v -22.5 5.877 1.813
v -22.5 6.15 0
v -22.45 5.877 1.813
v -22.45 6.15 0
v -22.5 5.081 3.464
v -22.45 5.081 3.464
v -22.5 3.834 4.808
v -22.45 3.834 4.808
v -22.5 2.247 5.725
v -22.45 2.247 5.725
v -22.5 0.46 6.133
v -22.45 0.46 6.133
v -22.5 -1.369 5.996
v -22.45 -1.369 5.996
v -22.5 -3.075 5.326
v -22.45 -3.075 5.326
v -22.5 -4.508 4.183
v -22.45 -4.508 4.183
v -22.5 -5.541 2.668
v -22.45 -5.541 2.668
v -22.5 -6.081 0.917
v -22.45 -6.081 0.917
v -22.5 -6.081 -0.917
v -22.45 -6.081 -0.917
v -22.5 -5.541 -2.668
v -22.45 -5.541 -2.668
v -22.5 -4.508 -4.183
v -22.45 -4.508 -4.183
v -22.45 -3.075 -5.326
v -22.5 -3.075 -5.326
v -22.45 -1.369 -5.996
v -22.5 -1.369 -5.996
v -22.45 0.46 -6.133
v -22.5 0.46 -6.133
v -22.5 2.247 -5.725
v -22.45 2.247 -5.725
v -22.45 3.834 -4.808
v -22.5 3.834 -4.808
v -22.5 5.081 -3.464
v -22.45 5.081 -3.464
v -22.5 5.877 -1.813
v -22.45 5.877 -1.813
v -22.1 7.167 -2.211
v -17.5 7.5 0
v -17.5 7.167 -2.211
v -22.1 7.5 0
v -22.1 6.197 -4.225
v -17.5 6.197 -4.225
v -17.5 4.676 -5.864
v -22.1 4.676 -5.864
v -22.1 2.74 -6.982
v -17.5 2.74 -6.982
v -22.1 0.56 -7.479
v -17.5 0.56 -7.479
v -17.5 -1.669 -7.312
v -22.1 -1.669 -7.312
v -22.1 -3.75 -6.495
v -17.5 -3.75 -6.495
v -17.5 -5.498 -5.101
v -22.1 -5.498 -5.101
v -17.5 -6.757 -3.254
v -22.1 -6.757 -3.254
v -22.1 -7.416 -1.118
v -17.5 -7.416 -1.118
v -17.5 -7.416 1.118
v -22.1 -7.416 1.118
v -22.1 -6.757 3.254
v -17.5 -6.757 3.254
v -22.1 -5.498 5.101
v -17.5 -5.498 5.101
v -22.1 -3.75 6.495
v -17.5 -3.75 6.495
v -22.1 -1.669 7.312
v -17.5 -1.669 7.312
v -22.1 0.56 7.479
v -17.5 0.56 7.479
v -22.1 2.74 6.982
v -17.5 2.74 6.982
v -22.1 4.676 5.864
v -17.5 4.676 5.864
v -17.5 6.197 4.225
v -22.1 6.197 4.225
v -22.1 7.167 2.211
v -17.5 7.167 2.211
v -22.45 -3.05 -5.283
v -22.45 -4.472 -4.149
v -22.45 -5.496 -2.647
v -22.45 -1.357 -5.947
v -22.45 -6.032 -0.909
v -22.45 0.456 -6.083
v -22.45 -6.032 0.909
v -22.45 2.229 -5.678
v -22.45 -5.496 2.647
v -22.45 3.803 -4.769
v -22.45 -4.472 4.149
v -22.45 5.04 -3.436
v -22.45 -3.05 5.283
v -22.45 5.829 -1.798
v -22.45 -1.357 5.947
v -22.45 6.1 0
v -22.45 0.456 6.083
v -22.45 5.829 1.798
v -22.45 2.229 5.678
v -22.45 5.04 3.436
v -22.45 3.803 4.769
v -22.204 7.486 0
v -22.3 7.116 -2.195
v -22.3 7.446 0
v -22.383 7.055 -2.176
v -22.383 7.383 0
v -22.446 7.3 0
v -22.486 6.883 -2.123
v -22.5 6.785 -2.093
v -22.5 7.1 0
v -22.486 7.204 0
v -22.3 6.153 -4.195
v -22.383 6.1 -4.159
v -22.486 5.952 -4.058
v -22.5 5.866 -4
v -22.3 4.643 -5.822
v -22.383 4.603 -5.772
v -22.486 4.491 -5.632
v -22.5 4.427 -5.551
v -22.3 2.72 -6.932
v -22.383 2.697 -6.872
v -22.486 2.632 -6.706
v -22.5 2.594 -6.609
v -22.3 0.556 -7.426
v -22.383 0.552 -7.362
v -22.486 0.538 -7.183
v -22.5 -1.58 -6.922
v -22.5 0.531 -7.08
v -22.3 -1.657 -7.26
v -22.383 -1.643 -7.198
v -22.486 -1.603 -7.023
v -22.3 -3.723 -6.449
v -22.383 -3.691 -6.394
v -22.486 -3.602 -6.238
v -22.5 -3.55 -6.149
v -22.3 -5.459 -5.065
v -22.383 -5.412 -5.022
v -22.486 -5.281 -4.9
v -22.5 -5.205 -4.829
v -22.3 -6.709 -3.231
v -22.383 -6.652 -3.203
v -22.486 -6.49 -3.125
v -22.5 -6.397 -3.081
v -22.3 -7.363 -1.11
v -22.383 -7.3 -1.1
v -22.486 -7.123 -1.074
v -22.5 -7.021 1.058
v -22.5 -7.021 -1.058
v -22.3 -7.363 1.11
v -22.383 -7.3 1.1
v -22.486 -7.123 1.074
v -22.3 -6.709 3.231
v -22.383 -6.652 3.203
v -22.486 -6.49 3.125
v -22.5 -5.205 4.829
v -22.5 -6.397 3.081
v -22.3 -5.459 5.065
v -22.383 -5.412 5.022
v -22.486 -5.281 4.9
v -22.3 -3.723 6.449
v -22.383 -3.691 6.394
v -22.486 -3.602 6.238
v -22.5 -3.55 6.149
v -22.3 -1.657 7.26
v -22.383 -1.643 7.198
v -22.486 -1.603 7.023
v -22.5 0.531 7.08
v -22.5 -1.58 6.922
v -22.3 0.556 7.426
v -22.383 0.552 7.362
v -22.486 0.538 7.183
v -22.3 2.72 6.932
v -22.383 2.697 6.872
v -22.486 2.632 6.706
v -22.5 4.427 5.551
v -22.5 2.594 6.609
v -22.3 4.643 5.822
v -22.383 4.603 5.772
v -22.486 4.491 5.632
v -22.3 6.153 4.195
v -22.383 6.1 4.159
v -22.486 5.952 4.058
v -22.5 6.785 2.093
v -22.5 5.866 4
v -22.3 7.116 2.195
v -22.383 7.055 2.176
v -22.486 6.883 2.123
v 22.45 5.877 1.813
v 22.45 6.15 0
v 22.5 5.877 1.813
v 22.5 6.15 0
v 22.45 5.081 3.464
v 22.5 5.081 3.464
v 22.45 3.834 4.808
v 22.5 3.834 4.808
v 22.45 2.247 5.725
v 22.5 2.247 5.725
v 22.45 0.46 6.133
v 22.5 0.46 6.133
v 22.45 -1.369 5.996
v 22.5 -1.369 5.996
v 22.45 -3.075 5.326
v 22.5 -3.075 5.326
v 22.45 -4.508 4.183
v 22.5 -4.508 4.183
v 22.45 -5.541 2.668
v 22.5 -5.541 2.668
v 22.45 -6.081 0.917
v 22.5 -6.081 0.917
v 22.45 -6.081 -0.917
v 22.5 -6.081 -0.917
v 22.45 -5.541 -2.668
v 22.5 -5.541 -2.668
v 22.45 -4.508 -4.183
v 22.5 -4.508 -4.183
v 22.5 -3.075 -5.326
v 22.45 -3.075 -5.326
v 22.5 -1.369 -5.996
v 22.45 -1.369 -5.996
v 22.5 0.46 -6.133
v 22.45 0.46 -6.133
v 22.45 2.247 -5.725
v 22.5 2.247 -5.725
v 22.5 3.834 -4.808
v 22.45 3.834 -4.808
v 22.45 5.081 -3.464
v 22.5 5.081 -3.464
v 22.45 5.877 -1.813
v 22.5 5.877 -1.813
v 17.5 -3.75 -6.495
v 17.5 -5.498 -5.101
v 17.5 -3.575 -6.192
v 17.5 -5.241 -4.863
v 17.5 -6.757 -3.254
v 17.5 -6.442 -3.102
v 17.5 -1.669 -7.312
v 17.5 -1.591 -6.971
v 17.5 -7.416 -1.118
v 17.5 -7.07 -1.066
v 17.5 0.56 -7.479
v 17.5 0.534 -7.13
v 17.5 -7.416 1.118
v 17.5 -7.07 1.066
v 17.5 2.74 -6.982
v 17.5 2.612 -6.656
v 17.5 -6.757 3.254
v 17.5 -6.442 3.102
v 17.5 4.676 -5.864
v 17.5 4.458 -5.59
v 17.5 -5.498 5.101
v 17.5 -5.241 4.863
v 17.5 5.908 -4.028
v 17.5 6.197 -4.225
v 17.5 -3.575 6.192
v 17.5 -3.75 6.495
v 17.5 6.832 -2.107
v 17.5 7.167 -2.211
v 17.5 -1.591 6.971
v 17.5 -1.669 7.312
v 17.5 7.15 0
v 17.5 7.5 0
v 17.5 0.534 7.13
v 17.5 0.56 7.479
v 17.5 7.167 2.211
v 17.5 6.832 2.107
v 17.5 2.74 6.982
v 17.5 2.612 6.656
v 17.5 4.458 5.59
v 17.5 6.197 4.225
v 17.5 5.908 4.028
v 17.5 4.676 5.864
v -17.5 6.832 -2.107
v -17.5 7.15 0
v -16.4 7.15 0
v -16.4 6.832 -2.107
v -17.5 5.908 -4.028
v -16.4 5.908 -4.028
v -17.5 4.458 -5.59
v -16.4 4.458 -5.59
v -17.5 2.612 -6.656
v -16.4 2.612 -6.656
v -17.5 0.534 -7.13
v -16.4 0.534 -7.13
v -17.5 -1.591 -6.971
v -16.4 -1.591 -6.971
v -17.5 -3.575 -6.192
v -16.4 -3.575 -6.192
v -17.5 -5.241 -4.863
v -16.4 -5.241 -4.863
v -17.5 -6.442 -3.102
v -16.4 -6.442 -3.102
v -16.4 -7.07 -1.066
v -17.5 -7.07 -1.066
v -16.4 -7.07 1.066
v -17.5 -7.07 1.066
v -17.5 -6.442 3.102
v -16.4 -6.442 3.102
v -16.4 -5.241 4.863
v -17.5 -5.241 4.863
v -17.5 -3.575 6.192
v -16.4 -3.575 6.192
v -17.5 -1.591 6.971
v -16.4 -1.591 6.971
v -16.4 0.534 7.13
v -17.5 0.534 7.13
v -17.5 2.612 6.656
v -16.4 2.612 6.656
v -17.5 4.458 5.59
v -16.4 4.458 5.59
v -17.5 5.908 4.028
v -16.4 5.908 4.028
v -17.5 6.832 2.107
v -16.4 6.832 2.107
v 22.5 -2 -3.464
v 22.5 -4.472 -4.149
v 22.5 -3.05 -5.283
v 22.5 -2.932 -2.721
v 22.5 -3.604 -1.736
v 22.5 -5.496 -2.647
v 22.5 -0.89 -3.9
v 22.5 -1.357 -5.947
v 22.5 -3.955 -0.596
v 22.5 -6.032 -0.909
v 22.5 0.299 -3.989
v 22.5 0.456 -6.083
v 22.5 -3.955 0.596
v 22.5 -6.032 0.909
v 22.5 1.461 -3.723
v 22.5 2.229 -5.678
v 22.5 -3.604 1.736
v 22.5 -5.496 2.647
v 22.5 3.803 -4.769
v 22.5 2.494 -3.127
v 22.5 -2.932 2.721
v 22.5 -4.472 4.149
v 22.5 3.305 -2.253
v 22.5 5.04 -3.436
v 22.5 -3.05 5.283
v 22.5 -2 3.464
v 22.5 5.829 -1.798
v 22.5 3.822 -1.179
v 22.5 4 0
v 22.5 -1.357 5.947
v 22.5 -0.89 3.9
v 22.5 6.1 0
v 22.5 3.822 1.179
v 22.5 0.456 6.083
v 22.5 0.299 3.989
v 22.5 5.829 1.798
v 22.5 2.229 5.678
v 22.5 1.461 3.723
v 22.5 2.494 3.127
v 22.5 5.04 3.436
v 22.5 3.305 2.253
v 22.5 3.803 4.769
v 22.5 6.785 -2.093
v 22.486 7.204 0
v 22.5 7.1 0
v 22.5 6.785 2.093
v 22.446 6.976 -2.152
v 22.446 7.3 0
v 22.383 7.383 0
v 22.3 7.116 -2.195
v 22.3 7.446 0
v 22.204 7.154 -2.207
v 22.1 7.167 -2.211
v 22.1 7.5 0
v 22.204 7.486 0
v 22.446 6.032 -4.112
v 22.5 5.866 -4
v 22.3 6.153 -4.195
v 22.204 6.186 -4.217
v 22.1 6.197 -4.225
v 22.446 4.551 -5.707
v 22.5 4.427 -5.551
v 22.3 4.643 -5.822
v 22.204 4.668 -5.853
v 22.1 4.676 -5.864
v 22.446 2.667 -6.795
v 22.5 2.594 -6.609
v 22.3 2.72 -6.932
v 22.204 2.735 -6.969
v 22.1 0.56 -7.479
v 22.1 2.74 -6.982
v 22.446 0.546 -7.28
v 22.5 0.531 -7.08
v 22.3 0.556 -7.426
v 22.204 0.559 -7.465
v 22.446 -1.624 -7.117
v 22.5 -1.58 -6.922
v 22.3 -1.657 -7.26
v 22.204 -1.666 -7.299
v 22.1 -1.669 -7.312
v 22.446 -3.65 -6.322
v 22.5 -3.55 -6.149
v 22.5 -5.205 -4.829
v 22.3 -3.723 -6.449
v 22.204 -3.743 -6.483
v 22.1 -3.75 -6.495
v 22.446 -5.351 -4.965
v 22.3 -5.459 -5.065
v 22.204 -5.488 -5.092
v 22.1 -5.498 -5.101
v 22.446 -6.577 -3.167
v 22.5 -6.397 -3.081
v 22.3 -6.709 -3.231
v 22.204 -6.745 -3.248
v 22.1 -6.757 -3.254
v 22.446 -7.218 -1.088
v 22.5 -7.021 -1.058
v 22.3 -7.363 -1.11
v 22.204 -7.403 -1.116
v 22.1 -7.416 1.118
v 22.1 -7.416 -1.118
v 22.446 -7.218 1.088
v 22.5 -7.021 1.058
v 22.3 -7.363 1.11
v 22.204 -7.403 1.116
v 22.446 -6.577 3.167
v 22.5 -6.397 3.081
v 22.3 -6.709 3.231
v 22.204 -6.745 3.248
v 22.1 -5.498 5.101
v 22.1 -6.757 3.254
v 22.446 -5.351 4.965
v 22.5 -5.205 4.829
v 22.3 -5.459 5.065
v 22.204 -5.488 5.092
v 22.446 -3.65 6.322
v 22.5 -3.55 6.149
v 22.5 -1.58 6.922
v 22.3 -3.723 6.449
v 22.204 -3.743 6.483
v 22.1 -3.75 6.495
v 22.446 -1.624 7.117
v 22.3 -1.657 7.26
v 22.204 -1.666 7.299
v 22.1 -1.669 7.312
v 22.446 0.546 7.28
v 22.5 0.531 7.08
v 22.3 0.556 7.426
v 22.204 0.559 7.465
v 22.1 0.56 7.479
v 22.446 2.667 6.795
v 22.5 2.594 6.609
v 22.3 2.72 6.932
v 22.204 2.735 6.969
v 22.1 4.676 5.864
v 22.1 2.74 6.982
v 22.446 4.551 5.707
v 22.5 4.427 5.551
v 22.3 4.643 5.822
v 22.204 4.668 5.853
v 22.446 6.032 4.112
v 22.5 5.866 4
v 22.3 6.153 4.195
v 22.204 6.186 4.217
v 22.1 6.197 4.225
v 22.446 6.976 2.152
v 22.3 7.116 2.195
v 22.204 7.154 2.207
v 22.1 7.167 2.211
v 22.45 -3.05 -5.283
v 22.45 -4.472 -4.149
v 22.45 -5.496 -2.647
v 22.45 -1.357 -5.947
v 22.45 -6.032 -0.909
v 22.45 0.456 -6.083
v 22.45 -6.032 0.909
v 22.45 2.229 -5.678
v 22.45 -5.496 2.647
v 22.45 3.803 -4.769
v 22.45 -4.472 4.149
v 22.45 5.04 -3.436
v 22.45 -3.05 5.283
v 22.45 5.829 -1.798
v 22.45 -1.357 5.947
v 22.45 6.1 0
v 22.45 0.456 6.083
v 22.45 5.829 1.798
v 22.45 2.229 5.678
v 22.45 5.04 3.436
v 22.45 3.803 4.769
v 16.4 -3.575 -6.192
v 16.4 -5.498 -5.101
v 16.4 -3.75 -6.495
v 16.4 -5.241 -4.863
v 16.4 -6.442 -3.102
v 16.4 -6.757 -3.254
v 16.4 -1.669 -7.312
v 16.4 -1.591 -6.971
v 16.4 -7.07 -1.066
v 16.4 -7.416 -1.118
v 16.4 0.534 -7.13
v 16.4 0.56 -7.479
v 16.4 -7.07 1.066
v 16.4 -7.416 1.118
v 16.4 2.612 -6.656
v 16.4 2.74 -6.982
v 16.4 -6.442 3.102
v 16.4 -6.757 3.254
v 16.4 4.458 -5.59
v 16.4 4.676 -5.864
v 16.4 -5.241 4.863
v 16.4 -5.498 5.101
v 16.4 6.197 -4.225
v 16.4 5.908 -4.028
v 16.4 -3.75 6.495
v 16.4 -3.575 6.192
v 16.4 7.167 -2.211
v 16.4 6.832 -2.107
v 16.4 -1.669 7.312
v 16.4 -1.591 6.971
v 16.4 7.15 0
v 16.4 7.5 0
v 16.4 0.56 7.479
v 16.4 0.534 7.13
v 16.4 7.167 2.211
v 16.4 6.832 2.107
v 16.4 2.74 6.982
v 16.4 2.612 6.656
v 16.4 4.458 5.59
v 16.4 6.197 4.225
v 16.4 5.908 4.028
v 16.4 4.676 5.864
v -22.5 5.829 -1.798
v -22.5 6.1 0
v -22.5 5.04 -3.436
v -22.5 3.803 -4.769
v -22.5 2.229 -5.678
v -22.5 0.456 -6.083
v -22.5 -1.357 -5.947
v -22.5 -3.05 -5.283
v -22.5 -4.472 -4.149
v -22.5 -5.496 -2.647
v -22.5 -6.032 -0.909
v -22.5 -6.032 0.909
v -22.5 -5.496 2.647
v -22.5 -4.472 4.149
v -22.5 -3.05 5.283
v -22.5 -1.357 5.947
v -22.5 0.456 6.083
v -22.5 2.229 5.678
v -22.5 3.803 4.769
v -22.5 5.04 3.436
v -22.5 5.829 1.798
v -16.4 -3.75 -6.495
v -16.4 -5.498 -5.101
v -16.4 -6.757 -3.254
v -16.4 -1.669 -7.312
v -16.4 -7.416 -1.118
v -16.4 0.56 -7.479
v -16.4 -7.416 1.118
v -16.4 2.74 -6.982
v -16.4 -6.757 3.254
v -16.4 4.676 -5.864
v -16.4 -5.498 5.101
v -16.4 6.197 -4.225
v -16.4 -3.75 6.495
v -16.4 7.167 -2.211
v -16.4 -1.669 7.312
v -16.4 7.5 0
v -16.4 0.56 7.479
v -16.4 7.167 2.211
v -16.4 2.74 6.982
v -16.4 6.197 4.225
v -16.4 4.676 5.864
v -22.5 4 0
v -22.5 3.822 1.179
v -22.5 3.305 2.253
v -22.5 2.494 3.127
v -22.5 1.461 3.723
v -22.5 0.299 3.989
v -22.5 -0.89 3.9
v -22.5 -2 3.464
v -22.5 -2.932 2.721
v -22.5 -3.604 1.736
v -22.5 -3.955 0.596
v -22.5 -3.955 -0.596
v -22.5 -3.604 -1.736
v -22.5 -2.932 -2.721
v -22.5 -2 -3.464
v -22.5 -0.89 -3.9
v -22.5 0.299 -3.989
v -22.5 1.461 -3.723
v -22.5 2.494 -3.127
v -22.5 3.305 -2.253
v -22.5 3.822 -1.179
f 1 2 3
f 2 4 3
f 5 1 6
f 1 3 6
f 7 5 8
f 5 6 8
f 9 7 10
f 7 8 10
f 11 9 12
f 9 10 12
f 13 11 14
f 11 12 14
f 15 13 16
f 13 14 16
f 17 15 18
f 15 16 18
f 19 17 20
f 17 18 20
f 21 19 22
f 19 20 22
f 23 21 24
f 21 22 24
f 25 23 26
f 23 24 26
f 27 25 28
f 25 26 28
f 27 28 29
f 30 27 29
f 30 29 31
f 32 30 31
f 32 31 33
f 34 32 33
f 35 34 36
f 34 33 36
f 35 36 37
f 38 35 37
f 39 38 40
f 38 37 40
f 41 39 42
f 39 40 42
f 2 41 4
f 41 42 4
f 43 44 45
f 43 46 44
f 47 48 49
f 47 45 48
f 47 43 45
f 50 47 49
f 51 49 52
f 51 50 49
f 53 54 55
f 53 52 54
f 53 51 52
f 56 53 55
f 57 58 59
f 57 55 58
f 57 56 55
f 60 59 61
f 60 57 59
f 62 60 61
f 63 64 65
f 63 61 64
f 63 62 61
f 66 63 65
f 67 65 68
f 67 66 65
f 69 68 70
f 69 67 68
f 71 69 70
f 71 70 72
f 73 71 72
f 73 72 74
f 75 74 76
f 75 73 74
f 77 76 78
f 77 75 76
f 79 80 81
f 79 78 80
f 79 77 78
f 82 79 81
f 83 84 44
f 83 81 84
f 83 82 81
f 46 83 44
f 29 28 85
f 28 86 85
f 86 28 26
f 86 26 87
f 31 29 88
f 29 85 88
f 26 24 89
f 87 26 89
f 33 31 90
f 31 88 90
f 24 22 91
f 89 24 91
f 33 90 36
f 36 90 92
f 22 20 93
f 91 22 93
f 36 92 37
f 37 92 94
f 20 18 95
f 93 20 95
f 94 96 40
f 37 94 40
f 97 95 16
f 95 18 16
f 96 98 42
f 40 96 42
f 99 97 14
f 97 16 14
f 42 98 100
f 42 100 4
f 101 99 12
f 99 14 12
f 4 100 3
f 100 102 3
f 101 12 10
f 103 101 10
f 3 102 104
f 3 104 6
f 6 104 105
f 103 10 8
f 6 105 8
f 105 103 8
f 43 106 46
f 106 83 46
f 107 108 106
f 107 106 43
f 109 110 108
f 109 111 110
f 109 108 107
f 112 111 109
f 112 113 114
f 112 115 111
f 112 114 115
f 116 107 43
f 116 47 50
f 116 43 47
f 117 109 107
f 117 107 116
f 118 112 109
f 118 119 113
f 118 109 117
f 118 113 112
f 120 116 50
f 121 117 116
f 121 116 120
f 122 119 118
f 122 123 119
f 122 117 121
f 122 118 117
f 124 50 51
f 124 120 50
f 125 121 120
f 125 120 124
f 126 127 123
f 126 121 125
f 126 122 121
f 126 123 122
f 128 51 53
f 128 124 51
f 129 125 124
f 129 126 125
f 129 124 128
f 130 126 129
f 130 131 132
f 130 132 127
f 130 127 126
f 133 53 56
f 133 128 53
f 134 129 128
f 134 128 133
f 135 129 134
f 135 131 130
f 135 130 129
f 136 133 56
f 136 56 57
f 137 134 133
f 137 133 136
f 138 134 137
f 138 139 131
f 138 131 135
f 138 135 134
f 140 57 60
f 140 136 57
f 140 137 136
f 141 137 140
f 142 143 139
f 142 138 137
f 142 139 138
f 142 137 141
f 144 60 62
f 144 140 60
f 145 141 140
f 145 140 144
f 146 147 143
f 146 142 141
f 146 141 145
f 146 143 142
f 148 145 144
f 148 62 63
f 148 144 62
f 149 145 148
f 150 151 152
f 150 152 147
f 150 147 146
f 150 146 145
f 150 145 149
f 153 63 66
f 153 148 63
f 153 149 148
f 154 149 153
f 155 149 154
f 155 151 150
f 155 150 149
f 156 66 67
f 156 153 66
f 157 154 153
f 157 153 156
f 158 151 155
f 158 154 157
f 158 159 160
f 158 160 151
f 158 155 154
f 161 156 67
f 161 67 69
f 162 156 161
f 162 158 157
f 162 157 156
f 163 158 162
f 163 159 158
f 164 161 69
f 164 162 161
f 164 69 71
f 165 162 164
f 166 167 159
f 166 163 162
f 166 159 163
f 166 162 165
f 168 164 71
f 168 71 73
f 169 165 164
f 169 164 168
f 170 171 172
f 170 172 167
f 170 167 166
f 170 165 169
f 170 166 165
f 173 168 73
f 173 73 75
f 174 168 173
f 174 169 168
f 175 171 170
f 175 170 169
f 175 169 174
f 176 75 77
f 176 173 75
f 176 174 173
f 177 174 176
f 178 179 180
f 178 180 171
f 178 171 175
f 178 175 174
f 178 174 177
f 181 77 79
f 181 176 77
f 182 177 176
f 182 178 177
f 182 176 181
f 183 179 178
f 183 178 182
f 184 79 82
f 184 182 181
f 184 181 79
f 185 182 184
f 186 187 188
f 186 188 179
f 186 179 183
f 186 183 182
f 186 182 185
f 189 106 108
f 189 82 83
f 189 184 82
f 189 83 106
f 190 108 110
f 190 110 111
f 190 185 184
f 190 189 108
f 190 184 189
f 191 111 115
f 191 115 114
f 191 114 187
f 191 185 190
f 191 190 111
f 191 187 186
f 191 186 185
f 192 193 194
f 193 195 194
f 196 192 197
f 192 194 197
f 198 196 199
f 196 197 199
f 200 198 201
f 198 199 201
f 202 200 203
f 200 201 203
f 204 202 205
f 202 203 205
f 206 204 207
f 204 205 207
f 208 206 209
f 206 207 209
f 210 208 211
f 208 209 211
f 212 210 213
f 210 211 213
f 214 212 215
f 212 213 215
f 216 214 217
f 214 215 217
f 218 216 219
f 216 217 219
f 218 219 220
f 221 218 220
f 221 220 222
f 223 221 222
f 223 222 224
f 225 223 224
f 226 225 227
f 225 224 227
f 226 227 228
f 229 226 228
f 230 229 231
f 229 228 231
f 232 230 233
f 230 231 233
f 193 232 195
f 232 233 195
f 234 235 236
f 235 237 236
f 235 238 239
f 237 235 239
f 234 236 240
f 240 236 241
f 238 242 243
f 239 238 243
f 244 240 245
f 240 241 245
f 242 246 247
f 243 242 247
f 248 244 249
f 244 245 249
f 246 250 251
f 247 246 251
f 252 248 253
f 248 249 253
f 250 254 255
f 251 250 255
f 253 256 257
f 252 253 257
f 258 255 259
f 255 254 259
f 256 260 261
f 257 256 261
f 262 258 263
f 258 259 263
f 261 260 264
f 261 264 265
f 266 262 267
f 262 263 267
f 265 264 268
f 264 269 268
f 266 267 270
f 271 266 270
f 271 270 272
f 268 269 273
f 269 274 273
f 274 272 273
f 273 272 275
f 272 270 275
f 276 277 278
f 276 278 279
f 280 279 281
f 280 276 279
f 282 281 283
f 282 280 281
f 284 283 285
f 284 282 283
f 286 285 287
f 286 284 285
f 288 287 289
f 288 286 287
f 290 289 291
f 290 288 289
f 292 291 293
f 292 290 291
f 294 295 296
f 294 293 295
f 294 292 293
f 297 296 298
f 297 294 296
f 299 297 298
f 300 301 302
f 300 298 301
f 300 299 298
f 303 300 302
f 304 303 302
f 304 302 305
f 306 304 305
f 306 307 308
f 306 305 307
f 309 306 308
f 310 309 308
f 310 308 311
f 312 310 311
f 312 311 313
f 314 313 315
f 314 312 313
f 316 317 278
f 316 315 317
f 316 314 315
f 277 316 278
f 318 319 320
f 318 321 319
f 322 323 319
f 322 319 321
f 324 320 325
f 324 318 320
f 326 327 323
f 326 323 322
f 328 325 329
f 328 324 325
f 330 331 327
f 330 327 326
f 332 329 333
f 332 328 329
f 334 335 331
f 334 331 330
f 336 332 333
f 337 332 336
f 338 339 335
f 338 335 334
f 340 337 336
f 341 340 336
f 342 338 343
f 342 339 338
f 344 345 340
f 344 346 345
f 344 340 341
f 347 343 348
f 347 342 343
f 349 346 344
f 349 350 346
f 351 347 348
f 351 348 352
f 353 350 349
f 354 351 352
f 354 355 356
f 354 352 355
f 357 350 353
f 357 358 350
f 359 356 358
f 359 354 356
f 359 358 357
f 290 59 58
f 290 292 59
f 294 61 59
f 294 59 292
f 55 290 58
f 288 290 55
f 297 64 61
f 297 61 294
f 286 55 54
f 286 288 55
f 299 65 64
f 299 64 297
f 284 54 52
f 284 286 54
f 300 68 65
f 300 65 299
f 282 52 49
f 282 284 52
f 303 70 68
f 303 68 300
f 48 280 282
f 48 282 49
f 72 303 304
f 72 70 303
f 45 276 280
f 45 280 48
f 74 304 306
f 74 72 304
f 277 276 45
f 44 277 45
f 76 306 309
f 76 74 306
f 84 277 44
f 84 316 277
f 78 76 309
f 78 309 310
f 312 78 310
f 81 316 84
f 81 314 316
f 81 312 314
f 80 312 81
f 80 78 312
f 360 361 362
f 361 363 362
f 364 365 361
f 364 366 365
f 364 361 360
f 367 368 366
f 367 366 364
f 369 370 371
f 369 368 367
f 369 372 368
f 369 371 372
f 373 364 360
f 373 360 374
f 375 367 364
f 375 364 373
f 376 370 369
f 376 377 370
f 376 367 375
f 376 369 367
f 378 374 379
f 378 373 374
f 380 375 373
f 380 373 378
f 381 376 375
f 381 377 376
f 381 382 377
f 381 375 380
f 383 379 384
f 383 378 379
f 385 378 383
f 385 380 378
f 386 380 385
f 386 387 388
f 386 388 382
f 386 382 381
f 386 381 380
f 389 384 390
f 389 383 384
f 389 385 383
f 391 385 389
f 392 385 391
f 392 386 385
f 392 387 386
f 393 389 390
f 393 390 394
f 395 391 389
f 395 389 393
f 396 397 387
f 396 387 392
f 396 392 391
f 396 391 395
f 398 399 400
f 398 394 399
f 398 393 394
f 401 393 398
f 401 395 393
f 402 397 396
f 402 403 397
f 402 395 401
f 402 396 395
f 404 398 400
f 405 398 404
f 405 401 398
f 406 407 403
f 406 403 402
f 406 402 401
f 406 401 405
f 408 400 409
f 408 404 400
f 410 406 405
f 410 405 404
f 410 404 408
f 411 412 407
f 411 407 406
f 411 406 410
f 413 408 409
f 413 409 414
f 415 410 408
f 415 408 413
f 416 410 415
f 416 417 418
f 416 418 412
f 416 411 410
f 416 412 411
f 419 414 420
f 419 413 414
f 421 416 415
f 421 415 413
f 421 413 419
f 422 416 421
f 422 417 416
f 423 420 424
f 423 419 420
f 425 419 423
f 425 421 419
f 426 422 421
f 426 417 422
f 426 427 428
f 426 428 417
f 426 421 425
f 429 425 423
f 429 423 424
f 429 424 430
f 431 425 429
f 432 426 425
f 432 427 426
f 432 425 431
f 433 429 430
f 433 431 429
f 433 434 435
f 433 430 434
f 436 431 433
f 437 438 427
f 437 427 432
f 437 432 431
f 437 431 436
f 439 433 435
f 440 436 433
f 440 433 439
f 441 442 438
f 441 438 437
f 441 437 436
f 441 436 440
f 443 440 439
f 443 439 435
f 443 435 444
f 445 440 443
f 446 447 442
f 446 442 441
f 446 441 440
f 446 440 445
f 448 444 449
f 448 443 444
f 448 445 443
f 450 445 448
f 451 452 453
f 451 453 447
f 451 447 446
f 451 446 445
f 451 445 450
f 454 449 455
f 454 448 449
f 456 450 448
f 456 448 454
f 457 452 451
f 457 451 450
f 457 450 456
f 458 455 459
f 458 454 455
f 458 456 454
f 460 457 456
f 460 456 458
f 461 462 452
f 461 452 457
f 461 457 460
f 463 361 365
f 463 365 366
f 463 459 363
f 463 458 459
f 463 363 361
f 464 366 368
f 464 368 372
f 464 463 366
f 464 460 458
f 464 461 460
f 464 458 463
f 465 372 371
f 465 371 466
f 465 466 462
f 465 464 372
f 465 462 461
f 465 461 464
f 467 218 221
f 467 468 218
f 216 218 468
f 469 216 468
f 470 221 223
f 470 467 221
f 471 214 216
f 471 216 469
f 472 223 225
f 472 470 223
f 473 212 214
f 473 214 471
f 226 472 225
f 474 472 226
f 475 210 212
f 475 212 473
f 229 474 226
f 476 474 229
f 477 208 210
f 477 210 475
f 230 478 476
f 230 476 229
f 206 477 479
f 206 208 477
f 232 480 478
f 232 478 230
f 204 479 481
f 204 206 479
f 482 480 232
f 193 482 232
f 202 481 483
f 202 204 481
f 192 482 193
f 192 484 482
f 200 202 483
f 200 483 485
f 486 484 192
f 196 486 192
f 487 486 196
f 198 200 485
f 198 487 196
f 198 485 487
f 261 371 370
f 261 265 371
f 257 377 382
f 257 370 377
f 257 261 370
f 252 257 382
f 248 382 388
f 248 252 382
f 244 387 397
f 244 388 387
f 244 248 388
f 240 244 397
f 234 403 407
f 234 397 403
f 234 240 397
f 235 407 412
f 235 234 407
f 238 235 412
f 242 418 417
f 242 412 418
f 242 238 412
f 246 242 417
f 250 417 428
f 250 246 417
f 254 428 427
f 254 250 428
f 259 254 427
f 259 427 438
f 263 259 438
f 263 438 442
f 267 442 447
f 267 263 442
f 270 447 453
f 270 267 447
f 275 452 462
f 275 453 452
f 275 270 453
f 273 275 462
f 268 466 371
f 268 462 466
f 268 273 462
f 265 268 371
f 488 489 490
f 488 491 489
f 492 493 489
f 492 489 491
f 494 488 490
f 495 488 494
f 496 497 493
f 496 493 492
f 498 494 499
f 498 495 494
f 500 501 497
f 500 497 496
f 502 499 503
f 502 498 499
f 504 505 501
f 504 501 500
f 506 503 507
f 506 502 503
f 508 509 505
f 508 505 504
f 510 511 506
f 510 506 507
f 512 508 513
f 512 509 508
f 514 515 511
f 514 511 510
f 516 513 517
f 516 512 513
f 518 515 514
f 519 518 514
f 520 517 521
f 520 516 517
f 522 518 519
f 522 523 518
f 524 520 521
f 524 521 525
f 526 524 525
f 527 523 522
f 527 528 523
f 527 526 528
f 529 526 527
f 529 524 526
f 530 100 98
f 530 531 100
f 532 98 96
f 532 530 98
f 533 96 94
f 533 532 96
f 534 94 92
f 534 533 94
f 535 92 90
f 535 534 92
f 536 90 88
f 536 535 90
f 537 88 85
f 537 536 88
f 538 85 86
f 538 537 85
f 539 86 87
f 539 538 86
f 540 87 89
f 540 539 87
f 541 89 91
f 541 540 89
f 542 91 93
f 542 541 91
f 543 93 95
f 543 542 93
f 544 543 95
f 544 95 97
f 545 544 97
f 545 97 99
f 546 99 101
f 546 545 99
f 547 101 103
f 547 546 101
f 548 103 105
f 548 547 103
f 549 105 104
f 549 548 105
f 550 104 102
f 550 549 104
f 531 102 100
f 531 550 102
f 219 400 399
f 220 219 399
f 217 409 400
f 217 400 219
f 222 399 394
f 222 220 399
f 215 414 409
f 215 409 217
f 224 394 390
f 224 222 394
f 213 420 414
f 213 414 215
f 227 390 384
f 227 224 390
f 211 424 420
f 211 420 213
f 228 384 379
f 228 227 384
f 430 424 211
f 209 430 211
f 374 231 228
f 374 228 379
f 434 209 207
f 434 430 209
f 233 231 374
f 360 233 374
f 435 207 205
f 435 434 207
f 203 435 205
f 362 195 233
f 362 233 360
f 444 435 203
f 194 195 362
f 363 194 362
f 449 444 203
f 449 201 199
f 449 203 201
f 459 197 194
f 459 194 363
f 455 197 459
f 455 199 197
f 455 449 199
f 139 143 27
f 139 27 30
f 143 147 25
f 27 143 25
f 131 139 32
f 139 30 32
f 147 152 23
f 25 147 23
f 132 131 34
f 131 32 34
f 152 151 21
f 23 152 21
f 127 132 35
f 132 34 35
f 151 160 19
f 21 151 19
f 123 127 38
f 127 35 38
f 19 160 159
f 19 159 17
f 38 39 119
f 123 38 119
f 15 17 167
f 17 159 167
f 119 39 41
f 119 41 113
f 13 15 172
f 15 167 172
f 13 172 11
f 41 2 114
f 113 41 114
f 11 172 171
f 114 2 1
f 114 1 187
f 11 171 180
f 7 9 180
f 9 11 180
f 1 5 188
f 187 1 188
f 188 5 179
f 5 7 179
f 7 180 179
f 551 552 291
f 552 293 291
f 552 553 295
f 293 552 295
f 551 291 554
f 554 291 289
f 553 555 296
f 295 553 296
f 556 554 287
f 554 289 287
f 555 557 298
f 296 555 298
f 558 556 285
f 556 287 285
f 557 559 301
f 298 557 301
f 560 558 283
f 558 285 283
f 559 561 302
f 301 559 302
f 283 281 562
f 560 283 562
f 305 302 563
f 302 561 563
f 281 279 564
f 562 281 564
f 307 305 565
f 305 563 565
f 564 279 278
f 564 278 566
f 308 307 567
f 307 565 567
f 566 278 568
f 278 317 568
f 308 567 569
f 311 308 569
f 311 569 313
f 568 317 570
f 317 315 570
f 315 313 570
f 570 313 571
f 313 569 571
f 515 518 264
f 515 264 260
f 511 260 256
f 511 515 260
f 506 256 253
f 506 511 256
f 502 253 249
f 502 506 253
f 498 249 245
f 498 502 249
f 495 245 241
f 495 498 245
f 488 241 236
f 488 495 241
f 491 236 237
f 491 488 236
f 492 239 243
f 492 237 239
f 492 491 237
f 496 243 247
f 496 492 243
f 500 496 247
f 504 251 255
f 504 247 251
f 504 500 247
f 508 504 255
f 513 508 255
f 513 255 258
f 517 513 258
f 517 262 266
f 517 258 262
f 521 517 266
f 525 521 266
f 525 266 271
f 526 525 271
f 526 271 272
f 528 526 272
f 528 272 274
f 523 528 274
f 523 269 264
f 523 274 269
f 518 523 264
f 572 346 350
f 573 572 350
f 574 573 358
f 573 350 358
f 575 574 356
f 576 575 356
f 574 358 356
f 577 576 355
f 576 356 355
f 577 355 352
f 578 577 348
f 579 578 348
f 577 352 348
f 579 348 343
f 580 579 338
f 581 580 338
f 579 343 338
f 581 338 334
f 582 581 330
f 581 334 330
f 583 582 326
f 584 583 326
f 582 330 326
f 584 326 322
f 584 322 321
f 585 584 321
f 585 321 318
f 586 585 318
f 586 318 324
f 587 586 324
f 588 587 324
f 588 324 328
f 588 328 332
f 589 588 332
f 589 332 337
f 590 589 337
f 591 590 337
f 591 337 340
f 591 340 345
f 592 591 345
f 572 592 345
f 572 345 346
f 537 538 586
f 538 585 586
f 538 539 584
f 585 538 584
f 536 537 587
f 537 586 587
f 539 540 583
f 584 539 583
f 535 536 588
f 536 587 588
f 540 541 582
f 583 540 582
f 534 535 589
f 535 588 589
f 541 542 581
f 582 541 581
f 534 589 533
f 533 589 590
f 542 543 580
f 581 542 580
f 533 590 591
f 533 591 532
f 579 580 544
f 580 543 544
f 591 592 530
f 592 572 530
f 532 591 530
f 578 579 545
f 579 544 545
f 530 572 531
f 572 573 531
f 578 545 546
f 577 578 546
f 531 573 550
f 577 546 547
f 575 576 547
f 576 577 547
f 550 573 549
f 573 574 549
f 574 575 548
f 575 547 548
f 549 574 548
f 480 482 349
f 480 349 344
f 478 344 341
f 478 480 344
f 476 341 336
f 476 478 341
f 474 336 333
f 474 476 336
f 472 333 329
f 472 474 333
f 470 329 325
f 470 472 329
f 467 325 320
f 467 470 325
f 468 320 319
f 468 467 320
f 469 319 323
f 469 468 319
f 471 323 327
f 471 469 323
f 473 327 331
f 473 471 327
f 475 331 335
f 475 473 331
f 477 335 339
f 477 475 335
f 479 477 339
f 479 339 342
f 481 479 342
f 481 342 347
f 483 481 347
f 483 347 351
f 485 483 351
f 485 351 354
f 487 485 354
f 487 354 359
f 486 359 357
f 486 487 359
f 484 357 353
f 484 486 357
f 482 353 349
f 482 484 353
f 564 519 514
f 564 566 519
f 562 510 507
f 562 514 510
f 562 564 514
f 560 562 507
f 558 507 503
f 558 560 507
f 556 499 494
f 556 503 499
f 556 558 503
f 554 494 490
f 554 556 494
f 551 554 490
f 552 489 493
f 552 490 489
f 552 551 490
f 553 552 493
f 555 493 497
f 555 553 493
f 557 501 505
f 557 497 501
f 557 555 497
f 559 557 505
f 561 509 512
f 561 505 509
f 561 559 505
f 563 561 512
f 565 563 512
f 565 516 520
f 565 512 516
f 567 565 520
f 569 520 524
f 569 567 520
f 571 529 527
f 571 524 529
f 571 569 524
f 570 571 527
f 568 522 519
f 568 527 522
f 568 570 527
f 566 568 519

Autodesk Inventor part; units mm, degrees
ref_plane "YZ Plane" through (0, 0, 0) normal (1, 0, 0) x (0, 1, 0)
ref_plane "XZ Plane" through (0, 0, 0) normal (0, 1, 0) x (-1, 0, 0)
ref_plane "XY Plane" through (0, 0, 0) normal (0, 0, 1) x (1, 0, 0)
sketch "Sketch_1" plane through (0, 0, 0) normal (0, 0, 1) x (1, 0, 0)
  line L0 (22.5, 0) -> (0, 0)
  line L1 (-22.5, 7.1) -> (-22.5, 6.15)
  line L2 (-22.5, 6.15) -> (-22.45, 6.15)
  line L3 (-22.45, 6.15) -> (-22.45, 6.1)
  line L4 (-22.45, 6.1) -> (22.45, 6.1)
  line L5 (22.45, 6.1) -> (22.45, 6.15)
  line L6 (22.45, 6.15) -> (22.5, 6.15)
  line L7 (22.5, 6.15) -> (22.5, 7.1)
  arc A0 (22.5, 7.1) -> (22.1, 7.5) centre (22.1, 7.1) ccw
  line L8 (22.1, 7.5) -> (17.5, 7.5)
  line L9 (17.5, 7.5) -> (17.5, 7.15)
  line L10 (17.5, 7.15) -> (16.4, 7.15)
  line L11 (16.4, 7.15) -> (16.4, 7.5)
  line L12 (16.4, 7.5) -> (-16.4, 7.5)
  line L13 (-16.4, 7.5) -> (-16.4, 7.15)
  line L14 (-16.4, 7.15) -> (-17.5, 7.15)
  line L15 (-17.5, 7.15) -> (-17.5, 7.5)
  line L16 (-17.5, 7.5) -> (-22.1, 7.5)
  arc A1 (-22.1, 7.5) -> (-22.5, 7.1) centre (-22.1, 7.1) ccw
revolve "Revolution1" add sketch "Sketch_1" angle 360 about axis through (22.5, 0, 0) along (1, 0, 0)
sketch "Sketch_3" plane through (0, 0, 0) normal (0, 0, 1) x (1, 0, 0)
  line L0 (22.5, 0) -> (0, 0)
  line L1 (-22.5, 6.1) -> (-22.5, 4)
  line L2 (-22.5, 4) -> (22.5, 4)
  line L3 (22.5, 4) -> (22.5, 6.1)
  line L4 (22.5, 6.1) -> (-22.5, 6.1)
revolve "Revolution2" add sketch "Sketch_3" angle 360 about axis through (22.5, 0, 0) along (1, 0, 0)
properties part number "C-LMUW8"
